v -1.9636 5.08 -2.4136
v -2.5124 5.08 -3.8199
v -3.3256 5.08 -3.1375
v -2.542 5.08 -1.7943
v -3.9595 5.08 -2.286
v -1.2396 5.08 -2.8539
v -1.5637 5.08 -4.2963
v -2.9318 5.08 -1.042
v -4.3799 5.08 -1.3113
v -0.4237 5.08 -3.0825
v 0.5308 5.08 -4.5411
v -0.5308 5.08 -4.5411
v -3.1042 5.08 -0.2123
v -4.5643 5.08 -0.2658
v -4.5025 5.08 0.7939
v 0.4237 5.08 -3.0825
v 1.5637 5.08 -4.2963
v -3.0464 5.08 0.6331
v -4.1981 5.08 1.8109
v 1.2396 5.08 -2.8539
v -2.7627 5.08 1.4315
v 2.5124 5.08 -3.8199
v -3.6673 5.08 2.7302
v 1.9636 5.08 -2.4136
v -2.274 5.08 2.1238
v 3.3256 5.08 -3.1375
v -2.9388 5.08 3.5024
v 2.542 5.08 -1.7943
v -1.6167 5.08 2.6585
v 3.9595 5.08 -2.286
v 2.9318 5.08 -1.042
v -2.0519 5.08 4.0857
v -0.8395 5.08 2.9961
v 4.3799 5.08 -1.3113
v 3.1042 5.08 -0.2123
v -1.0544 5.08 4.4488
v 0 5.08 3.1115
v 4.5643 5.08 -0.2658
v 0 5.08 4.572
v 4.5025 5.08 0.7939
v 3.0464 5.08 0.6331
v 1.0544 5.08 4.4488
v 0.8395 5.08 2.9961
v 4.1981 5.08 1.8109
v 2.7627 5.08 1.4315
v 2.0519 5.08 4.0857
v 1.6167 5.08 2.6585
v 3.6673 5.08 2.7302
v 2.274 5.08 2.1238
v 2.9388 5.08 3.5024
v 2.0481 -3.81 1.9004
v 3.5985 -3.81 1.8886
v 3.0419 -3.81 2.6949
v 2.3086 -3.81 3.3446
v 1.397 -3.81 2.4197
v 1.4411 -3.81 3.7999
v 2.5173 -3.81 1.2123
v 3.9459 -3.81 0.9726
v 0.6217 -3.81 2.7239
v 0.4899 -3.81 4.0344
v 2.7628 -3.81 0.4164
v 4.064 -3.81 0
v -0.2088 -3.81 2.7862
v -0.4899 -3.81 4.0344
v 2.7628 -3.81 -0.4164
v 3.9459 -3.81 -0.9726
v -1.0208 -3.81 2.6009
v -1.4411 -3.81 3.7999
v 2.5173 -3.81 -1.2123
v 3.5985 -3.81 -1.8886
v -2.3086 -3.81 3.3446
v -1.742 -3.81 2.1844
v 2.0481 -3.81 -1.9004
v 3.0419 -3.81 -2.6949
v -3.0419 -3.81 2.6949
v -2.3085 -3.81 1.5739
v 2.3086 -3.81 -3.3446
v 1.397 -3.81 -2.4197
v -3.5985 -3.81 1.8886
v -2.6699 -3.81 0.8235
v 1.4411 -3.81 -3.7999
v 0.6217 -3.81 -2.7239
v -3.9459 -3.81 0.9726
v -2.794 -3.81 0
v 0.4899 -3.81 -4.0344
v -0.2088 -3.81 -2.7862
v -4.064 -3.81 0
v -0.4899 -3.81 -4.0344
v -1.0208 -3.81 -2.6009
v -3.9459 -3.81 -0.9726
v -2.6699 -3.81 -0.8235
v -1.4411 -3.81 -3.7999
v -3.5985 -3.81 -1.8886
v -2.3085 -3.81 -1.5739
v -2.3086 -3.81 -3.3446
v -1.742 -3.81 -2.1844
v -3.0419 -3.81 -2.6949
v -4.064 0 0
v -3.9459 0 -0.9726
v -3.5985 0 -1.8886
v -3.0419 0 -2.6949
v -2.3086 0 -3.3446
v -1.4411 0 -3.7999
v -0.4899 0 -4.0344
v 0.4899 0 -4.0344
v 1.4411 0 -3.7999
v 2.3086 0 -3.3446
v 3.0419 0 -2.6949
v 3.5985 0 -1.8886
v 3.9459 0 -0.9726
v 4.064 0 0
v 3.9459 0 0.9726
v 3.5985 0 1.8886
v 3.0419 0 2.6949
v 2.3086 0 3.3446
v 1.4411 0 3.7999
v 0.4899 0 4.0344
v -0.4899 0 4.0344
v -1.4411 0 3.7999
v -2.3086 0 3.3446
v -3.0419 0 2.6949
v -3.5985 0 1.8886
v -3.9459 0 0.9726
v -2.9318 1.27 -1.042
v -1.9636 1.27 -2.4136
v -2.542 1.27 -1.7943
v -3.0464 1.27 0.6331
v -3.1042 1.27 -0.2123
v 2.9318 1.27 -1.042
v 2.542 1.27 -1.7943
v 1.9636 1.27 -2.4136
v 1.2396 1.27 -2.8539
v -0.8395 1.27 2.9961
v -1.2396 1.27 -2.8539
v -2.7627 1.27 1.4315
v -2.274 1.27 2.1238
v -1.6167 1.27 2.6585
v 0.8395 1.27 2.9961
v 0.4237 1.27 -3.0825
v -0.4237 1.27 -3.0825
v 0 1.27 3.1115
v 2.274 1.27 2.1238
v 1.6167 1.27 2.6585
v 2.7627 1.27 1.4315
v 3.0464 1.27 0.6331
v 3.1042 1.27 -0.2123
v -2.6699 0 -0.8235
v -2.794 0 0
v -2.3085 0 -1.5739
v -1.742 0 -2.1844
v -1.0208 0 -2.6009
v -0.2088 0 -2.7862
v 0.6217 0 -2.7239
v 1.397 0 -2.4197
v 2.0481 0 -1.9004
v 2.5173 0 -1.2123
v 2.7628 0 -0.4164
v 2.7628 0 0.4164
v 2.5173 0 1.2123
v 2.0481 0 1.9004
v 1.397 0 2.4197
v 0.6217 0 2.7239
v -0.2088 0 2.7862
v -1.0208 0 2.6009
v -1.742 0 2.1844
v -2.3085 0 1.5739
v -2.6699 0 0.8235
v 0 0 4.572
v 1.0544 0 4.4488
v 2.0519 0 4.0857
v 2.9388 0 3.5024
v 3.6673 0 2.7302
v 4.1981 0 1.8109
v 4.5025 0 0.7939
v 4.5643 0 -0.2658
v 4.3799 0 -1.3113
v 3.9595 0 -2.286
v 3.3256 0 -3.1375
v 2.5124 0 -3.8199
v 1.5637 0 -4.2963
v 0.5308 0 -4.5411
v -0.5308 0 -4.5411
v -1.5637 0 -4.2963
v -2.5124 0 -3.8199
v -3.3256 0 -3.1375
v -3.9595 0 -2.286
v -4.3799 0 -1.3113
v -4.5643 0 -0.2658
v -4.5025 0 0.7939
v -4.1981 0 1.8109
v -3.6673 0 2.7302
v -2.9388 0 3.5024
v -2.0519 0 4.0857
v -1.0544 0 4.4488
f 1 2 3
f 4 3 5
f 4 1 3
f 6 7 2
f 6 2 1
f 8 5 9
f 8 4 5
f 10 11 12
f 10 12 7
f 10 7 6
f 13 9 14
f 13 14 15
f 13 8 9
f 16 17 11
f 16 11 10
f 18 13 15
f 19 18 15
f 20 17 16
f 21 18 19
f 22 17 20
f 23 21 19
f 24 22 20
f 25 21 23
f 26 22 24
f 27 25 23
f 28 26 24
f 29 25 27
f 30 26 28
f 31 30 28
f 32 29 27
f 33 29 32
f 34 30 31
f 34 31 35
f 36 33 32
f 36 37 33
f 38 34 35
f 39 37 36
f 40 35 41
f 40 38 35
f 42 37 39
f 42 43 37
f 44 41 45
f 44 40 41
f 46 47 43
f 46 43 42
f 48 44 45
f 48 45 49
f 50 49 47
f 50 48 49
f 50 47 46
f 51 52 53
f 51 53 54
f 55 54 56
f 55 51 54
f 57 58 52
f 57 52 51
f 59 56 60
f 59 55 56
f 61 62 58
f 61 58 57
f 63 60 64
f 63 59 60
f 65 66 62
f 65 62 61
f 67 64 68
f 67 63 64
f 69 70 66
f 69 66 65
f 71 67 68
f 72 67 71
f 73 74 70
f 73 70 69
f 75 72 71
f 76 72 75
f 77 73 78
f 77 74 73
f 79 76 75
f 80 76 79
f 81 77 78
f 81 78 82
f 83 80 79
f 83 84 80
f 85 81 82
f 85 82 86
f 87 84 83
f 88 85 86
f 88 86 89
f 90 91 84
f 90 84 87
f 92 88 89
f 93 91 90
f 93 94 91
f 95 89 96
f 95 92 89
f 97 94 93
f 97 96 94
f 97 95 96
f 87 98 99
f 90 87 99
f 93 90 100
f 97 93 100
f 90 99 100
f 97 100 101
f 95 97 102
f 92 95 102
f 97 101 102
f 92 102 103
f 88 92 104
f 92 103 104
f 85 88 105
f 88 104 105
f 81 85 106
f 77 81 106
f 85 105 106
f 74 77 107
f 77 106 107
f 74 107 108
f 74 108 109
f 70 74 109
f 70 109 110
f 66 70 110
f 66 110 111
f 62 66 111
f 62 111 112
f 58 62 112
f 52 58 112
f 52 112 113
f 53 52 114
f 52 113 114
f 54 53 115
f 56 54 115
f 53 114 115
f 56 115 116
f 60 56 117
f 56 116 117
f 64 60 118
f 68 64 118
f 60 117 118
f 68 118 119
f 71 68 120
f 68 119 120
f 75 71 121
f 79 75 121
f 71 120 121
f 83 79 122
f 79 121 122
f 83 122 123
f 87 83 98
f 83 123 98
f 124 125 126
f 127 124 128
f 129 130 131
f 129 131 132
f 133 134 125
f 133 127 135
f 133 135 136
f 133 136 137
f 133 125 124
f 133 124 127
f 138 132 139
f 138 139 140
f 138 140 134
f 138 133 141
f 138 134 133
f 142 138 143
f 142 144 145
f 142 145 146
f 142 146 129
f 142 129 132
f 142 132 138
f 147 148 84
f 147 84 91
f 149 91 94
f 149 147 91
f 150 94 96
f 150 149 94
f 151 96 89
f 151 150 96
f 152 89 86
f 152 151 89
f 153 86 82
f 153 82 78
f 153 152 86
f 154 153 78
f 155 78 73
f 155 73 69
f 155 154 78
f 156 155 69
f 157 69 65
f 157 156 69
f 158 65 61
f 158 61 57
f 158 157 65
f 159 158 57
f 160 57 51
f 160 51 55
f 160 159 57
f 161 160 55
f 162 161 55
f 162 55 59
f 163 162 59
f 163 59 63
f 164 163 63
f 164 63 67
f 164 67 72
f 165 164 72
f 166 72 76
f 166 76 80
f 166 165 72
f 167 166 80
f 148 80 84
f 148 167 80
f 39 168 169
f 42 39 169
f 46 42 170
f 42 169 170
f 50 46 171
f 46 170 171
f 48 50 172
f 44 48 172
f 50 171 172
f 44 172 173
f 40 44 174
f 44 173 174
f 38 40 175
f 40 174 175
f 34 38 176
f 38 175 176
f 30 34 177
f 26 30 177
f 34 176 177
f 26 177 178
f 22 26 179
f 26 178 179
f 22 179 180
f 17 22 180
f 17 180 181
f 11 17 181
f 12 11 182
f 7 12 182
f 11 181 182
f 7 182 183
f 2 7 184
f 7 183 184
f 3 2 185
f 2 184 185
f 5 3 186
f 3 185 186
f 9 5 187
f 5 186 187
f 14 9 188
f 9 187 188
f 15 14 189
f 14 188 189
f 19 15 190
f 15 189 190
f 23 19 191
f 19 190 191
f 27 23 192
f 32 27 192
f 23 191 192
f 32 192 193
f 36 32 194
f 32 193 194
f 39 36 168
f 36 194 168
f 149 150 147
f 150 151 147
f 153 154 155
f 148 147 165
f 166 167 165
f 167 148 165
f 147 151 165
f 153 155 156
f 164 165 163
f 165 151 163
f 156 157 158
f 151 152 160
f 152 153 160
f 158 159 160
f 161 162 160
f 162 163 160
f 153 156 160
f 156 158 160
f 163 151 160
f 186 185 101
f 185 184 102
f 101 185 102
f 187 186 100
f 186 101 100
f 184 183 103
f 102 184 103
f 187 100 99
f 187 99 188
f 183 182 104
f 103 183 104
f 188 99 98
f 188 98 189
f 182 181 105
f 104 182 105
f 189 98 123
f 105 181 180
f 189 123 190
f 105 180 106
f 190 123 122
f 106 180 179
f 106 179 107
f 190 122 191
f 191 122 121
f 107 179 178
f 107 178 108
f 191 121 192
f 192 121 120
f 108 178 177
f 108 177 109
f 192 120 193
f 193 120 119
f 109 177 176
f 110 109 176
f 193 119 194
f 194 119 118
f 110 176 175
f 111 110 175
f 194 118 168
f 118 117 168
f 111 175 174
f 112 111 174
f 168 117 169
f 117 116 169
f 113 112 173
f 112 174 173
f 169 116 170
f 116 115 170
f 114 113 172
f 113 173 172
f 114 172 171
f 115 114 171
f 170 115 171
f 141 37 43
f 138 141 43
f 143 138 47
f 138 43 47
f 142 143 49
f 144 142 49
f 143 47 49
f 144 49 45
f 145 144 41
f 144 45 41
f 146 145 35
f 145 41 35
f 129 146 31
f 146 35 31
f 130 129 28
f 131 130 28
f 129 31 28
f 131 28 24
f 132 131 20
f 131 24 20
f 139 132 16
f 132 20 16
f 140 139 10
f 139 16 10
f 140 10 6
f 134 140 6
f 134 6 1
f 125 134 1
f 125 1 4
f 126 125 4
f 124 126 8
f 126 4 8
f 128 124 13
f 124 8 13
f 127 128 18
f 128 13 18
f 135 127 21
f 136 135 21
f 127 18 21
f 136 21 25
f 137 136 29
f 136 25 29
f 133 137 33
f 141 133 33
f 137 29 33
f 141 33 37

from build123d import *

# Parameters (mm, degrees)
SKETCH1_R           = 4.572
BOSS_EXTRUDE1_DEPTH = 5.08
SKETCH2_R           = 3.1115
CUT_EXTRUDE1_DEPTH  = 3.81
SKETCH3_R           = 4.064
SKETCH3_R_2         = 2.794
EXTRUDE_THIN1_DEPTH = 3.81


with BuildPart() as part:
    # Sketch1 → Boss-Extrude1 (new body)
    with BuildSketch(Plane(origin=(0, 0, 0), x_dir=(1, 0, 0), z_dir=(0, 1, 0))):
        with Locations(Location((0, 0, 0), (0, 0, 270))):
            Circle(SKETCH1_R)
    extrude(amount=BOSS_EXTRUDE1_DEPTH)

    # Sketch2 → Cut-Extrude1 (cut)
    with BuildSketch(Plane(origin=(0, 5.08, 0), x_dir=(1, 0, 0), z_dir=(0, 1, 0))):
        with Locations(Location((0, 0, 0), (0, 0, 270))):
            Circle(SKETCH2_R)
    extrude(amount=-CUT_EXTRUDE1_DEPTH, mode=Mode.SUBTRACT)

    # Sketch3 → Extrude-Thin1 (add)
    with BuildSketch(Plane(origin=(0, 0, 0), x_dir=(-1, 0, 0), z_dir=(0, -1, 0))):
        Circle(SKETCH3_R)
        Circle(SKETCH3_R_2, mode=Mode.SUBTRACT)
    extrude(amount=EXTRUDE_THIN1_DEPTH)


solid = part.part
